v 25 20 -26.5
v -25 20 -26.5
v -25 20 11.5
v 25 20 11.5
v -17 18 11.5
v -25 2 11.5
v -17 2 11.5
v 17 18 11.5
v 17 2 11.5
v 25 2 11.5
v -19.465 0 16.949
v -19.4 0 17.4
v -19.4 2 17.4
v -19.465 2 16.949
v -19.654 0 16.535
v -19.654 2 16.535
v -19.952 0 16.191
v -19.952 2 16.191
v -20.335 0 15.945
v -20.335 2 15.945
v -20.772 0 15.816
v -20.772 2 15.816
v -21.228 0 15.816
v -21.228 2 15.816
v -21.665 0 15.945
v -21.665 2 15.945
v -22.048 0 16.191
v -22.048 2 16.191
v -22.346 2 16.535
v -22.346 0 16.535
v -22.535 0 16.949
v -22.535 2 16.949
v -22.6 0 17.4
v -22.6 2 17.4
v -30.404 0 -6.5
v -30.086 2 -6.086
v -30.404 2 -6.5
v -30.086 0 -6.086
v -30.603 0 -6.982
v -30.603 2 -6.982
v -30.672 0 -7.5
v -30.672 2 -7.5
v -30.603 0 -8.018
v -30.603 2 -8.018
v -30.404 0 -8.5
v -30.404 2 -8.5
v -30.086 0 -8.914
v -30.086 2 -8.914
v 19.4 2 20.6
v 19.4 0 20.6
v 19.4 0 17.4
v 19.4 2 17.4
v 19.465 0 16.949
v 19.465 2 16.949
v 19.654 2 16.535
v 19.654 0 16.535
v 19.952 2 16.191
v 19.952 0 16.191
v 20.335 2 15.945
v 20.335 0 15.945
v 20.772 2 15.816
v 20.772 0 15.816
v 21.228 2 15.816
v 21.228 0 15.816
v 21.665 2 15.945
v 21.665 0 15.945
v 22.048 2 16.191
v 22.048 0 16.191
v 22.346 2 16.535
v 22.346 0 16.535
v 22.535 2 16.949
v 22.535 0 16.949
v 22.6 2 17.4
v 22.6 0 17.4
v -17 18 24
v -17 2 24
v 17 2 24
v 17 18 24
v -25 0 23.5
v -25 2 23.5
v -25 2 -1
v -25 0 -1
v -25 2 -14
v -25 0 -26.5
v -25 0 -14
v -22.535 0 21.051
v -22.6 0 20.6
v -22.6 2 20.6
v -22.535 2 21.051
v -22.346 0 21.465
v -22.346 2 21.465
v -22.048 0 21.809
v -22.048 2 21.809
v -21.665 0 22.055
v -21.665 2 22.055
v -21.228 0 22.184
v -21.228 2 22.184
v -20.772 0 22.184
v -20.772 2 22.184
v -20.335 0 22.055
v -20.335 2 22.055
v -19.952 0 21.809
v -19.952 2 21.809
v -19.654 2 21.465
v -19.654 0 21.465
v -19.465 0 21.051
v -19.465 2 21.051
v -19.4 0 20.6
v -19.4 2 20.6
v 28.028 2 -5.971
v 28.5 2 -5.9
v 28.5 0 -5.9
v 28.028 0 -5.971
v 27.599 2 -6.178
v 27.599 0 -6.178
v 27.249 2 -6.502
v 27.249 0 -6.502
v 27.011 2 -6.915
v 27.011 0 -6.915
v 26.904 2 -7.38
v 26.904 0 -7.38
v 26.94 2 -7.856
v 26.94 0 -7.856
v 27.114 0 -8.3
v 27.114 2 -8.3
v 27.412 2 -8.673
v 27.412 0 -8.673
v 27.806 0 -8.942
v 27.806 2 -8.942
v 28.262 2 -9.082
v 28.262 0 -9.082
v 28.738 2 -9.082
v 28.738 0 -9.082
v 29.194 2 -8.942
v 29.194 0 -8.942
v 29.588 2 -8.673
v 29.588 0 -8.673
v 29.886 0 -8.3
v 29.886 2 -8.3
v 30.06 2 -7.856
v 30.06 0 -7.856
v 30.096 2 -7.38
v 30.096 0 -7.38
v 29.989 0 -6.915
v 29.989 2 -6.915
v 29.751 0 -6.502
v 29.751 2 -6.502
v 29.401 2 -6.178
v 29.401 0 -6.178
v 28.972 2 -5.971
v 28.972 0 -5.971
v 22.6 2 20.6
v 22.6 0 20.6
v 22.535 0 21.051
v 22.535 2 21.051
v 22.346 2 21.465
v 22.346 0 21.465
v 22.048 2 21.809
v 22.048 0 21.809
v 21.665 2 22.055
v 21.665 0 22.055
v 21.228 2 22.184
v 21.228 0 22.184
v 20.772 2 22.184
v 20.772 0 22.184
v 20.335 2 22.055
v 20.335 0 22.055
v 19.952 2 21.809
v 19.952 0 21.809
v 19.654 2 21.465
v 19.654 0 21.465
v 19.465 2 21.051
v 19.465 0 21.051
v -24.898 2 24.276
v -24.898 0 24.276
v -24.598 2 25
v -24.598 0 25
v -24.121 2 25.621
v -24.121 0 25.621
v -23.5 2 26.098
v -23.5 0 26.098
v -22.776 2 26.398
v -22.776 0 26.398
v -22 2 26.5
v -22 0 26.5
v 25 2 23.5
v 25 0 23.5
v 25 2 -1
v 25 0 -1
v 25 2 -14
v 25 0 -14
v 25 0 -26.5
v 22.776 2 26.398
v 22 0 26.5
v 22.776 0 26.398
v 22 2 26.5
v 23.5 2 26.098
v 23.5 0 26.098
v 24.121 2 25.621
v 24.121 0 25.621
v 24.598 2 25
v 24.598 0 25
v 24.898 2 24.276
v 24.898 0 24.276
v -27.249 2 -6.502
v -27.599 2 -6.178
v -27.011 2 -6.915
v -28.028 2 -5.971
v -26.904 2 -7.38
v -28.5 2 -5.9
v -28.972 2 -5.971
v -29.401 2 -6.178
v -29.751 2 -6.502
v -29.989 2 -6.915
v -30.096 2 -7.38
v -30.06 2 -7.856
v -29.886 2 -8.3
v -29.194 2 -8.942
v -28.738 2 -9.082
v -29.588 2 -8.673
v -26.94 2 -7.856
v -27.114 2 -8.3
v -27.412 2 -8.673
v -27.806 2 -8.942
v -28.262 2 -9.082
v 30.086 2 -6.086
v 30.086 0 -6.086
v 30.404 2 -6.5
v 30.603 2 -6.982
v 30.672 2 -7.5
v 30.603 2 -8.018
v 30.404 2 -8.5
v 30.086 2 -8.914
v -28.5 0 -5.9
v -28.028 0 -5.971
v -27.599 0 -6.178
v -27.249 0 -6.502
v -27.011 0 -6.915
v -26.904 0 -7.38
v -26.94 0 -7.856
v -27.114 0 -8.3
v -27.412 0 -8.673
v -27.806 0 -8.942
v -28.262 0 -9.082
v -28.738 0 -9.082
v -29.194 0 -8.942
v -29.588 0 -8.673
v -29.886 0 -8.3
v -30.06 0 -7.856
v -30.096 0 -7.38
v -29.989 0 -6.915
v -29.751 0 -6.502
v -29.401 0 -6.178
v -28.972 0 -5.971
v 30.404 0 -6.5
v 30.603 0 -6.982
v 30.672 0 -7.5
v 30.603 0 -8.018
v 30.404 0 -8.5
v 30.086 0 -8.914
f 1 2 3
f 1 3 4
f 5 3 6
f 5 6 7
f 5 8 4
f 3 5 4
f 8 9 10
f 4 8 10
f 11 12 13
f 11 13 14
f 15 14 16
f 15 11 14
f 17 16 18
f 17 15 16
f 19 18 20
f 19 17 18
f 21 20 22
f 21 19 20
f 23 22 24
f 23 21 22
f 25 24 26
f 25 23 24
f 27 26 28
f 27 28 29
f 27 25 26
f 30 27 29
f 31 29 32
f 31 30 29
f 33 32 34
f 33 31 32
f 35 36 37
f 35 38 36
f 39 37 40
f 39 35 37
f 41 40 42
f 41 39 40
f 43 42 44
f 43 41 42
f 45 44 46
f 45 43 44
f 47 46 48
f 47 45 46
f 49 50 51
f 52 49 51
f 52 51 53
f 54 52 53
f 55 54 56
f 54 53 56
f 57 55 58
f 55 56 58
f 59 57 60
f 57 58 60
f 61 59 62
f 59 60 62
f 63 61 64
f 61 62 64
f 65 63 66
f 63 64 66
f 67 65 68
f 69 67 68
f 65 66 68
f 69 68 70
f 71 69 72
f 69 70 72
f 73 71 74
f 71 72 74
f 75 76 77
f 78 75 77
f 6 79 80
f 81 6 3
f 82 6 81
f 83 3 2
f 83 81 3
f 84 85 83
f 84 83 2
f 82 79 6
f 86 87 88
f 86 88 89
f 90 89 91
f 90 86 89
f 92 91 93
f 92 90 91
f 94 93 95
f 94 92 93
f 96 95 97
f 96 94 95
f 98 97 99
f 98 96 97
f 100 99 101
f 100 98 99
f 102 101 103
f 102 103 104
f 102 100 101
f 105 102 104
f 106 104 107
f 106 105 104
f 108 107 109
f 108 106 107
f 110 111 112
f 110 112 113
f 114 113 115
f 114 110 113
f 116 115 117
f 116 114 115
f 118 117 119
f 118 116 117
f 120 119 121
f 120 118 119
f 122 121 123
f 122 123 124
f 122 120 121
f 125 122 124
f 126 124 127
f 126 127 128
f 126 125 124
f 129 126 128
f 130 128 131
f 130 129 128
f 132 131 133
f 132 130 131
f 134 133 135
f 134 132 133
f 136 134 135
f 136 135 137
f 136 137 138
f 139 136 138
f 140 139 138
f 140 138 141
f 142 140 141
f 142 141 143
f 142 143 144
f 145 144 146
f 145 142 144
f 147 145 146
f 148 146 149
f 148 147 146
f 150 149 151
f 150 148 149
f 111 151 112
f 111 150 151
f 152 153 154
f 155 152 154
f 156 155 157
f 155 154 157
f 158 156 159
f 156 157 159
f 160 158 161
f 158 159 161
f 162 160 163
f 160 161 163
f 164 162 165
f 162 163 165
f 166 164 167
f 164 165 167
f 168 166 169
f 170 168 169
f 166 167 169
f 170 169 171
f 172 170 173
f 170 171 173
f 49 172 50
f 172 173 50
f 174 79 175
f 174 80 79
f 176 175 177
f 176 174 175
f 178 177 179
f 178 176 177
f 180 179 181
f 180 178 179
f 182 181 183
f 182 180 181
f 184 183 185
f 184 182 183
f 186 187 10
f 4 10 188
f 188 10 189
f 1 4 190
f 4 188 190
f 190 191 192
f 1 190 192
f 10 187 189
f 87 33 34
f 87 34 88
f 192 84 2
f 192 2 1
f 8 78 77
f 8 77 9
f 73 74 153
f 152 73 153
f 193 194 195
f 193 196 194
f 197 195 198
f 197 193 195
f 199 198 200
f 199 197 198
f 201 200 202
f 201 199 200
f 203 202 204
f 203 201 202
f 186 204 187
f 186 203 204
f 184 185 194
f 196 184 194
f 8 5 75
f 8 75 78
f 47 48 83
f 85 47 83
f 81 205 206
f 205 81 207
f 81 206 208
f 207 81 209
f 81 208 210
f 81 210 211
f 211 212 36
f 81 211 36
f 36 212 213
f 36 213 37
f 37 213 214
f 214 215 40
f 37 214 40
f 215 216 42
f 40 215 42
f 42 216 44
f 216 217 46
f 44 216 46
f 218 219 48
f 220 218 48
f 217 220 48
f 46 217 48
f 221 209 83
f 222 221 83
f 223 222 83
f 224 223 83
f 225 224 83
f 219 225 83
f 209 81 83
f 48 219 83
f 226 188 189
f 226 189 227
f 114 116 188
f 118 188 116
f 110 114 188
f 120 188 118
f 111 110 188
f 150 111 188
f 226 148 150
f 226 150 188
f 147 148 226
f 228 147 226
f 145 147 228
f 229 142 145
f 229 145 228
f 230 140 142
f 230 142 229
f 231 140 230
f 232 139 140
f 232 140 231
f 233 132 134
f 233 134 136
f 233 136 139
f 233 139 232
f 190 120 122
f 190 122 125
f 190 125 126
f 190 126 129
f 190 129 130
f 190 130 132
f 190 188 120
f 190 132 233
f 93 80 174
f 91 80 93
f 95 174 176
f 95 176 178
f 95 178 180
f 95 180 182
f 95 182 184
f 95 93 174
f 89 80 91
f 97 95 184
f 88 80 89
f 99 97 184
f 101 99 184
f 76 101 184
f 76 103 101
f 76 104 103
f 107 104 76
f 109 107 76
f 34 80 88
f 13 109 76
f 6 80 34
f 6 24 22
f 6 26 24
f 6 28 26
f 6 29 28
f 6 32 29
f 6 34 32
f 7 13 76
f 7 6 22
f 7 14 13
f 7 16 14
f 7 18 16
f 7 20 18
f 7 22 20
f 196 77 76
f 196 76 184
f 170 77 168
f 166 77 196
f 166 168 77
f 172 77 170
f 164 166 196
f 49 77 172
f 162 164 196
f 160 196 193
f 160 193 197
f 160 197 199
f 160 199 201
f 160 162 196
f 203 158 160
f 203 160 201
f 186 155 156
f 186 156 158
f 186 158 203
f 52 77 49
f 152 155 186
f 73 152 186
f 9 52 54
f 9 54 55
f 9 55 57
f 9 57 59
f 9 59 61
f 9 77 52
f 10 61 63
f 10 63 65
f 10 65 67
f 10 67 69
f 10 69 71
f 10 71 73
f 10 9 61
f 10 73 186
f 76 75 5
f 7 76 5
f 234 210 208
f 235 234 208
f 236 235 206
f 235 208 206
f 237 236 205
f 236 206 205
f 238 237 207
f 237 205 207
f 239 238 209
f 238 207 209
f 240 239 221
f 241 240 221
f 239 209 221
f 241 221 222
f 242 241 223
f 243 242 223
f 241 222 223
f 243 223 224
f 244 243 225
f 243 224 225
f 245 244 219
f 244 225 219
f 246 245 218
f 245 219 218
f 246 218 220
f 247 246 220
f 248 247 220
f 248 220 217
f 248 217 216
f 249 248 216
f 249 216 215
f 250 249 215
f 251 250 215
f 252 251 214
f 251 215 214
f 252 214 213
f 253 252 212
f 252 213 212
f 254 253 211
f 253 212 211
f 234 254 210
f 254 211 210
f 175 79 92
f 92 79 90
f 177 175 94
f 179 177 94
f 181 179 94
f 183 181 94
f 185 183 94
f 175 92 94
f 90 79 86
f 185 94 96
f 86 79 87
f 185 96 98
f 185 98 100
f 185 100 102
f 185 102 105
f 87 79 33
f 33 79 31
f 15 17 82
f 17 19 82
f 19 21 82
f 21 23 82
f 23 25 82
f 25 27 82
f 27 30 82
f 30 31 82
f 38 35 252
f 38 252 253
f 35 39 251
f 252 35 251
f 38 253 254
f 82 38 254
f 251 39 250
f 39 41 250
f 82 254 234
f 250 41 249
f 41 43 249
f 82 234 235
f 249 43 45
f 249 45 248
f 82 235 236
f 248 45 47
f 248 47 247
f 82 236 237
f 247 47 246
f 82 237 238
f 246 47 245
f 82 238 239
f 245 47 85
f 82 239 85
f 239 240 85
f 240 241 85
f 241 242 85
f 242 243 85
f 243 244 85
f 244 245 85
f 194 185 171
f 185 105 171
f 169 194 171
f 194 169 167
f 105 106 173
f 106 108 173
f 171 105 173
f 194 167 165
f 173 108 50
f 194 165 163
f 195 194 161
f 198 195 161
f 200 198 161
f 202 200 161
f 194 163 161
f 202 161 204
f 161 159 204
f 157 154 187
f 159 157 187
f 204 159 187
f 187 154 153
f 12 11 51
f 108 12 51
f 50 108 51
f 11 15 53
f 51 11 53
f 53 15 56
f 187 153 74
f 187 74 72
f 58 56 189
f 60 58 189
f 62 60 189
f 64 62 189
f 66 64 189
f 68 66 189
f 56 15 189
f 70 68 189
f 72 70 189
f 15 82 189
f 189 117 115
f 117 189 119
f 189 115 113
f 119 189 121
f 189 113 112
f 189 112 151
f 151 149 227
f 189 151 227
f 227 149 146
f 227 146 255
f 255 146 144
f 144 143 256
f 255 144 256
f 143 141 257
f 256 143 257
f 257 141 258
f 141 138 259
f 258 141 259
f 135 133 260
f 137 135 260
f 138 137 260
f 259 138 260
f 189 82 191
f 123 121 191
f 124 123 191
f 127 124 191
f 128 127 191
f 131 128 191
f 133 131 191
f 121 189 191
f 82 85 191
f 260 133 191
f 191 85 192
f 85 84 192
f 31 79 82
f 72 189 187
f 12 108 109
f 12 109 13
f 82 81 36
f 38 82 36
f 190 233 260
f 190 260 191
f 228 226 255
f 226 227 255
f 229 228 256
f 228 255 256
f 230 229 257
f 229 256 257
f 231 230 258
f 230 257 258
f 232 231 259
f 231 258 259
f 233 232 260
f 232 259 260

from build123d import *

# Parameters (mm, degrees)
SZKIC2_W                    = 50
SZKIC2_H                    = 53
DODANIE_WYCI_GNI_CIE1_DEPTH = 2
ZAOKR_GLENIE1_R             = 3
SZKIC3_W                    = 50
SZKIC3_H                    = 38
DODANIE_WYCI_GNI_CIE2_DEPTH = 18
SZKIC4_W                    = 34
SZKIC4_H                    = 12.5
DODANIE_WYCI_GNI_CIE3_DEPTH = 16
SZKIC5_R                    = 1.6
DODANIE_WYCI_GNI_CIE4_DEPTH = 2
ZAOKR_GLENIE2_R             = 2


with BuildPart() as part:
    # Szkic2 → Dodanie-wyciągnięcie1 (new body)
    with BuildSketch(Plane(origin=(0, 0, 0), x_dir=(1, 0, 0), z_dir=(0, 1, 0))):
        Rectangle(SZKIC2_W, SZKIC2_H)
        with BuildLine():
            Line((22.6, -17.4), (22.6, -20.6))
            ThreePointArc((22.6, -20.6), (21, -22.2), (19.4, -20.6))
            Line((19.4, -20.6), (19.4, -17.4))
            ThreePointArc((19.4, -17.4), (21, -15.8), (22.6, -17.4))
        make_face(mode=Mode.SUBTRACT)
        with BuildLine():
            Line((-22.6, -17.4), (-22.6, -20.6))
            ThreePointArc((-22.6, -20.6), (-21, -22.2), (-19.4, -20.6))
            Line((-19.4, -20.6), (-19.4, -17.4))
            ThreePointArc((-19.4, -17.4), (-21, -15.8), (-22.6, -17.4))
        make_face(mode=Mode.SUBTRACT)
    extrude(amount=DODANIE_WYCI_GNI_CIE1_DEPTH)

    # Zaokrąglenie1
    zaokr_glenie1_edges = [part.edges().sort_by_distance(p)[0] for p in [
        (25, 1, 26.5),
        (-25, 1, 26.5),
    ]]
    fillet(zaokr_glenie1_edges, radius=ZAOKR_GLENIE1_R)

    # Szkic3 → Dodanie-wyciągnięcie2 (add)
    with BuildSketch(Plane(origin=(0, 2, 0), x_dir=(1, 0, 0), z_dir=(0, 1, 0))):
        with Locations((0, 7.5)):
            Rectangle(SZKIC3_W, SZKIC3_H)
    extrude(amount=DODANIE_WYCI_GNI_CIE2_DEPTH)

    # Szkic4 → Dodanie-wyciągnięcie3 (add)
    with BuildSketch(Plane(origin=(0, 2, 0), x_dir=(1, 0, 0), z_dir=(0, 1, 0))):
        with Locations((0, -17.75)):
            Rectangle(SZKIC4_W, SZKIC4_H)
    extrude(amount=DODANIE_WYCI_GNI_CIE3_DEPTH)

    # Szkic5 → Dodanie-wyciągnięcie4 (add)
    with BuildSketch(Plane(origin=(0, 2, 0), x_dir=(1, 0, 0), z_dir=(0, 1, 0))):
        Polygon((-31.5, 7.5), (-25, 14), (-25, 1), align=None)
        with Locations(Location((-28.5, 7.5, 0), (0, 0, 270))):
            Circle(SZKIC5_R, mode=Mode.SUBTRACT)
    dodanie_wyci_gni_cie4 = extrude(amount=-DODANIE_WYCI_GNI_CIE4_DEPTH)

    # Lustro1: Dodanie-wyciągnięcie4 across plane
    add(dodanie_wyci_gni_cie4.mirror(Plane(origin=(0, 0, 0), x_dir=(0, 0, 1), z_dir=(1, 0, 0))))

    # Zaokrąglenie2
    zaokr_glenie2_edges = [part.edges().sort_by_distance(p)[0] for p in [
        (-31.5, 1, -7.5),
        (31.5, 1, -7.5),
    ]]
    fillet(zaokr_glenie2_edges, radius=ZAOKR_GLENIE2_R)


solid = part.part
